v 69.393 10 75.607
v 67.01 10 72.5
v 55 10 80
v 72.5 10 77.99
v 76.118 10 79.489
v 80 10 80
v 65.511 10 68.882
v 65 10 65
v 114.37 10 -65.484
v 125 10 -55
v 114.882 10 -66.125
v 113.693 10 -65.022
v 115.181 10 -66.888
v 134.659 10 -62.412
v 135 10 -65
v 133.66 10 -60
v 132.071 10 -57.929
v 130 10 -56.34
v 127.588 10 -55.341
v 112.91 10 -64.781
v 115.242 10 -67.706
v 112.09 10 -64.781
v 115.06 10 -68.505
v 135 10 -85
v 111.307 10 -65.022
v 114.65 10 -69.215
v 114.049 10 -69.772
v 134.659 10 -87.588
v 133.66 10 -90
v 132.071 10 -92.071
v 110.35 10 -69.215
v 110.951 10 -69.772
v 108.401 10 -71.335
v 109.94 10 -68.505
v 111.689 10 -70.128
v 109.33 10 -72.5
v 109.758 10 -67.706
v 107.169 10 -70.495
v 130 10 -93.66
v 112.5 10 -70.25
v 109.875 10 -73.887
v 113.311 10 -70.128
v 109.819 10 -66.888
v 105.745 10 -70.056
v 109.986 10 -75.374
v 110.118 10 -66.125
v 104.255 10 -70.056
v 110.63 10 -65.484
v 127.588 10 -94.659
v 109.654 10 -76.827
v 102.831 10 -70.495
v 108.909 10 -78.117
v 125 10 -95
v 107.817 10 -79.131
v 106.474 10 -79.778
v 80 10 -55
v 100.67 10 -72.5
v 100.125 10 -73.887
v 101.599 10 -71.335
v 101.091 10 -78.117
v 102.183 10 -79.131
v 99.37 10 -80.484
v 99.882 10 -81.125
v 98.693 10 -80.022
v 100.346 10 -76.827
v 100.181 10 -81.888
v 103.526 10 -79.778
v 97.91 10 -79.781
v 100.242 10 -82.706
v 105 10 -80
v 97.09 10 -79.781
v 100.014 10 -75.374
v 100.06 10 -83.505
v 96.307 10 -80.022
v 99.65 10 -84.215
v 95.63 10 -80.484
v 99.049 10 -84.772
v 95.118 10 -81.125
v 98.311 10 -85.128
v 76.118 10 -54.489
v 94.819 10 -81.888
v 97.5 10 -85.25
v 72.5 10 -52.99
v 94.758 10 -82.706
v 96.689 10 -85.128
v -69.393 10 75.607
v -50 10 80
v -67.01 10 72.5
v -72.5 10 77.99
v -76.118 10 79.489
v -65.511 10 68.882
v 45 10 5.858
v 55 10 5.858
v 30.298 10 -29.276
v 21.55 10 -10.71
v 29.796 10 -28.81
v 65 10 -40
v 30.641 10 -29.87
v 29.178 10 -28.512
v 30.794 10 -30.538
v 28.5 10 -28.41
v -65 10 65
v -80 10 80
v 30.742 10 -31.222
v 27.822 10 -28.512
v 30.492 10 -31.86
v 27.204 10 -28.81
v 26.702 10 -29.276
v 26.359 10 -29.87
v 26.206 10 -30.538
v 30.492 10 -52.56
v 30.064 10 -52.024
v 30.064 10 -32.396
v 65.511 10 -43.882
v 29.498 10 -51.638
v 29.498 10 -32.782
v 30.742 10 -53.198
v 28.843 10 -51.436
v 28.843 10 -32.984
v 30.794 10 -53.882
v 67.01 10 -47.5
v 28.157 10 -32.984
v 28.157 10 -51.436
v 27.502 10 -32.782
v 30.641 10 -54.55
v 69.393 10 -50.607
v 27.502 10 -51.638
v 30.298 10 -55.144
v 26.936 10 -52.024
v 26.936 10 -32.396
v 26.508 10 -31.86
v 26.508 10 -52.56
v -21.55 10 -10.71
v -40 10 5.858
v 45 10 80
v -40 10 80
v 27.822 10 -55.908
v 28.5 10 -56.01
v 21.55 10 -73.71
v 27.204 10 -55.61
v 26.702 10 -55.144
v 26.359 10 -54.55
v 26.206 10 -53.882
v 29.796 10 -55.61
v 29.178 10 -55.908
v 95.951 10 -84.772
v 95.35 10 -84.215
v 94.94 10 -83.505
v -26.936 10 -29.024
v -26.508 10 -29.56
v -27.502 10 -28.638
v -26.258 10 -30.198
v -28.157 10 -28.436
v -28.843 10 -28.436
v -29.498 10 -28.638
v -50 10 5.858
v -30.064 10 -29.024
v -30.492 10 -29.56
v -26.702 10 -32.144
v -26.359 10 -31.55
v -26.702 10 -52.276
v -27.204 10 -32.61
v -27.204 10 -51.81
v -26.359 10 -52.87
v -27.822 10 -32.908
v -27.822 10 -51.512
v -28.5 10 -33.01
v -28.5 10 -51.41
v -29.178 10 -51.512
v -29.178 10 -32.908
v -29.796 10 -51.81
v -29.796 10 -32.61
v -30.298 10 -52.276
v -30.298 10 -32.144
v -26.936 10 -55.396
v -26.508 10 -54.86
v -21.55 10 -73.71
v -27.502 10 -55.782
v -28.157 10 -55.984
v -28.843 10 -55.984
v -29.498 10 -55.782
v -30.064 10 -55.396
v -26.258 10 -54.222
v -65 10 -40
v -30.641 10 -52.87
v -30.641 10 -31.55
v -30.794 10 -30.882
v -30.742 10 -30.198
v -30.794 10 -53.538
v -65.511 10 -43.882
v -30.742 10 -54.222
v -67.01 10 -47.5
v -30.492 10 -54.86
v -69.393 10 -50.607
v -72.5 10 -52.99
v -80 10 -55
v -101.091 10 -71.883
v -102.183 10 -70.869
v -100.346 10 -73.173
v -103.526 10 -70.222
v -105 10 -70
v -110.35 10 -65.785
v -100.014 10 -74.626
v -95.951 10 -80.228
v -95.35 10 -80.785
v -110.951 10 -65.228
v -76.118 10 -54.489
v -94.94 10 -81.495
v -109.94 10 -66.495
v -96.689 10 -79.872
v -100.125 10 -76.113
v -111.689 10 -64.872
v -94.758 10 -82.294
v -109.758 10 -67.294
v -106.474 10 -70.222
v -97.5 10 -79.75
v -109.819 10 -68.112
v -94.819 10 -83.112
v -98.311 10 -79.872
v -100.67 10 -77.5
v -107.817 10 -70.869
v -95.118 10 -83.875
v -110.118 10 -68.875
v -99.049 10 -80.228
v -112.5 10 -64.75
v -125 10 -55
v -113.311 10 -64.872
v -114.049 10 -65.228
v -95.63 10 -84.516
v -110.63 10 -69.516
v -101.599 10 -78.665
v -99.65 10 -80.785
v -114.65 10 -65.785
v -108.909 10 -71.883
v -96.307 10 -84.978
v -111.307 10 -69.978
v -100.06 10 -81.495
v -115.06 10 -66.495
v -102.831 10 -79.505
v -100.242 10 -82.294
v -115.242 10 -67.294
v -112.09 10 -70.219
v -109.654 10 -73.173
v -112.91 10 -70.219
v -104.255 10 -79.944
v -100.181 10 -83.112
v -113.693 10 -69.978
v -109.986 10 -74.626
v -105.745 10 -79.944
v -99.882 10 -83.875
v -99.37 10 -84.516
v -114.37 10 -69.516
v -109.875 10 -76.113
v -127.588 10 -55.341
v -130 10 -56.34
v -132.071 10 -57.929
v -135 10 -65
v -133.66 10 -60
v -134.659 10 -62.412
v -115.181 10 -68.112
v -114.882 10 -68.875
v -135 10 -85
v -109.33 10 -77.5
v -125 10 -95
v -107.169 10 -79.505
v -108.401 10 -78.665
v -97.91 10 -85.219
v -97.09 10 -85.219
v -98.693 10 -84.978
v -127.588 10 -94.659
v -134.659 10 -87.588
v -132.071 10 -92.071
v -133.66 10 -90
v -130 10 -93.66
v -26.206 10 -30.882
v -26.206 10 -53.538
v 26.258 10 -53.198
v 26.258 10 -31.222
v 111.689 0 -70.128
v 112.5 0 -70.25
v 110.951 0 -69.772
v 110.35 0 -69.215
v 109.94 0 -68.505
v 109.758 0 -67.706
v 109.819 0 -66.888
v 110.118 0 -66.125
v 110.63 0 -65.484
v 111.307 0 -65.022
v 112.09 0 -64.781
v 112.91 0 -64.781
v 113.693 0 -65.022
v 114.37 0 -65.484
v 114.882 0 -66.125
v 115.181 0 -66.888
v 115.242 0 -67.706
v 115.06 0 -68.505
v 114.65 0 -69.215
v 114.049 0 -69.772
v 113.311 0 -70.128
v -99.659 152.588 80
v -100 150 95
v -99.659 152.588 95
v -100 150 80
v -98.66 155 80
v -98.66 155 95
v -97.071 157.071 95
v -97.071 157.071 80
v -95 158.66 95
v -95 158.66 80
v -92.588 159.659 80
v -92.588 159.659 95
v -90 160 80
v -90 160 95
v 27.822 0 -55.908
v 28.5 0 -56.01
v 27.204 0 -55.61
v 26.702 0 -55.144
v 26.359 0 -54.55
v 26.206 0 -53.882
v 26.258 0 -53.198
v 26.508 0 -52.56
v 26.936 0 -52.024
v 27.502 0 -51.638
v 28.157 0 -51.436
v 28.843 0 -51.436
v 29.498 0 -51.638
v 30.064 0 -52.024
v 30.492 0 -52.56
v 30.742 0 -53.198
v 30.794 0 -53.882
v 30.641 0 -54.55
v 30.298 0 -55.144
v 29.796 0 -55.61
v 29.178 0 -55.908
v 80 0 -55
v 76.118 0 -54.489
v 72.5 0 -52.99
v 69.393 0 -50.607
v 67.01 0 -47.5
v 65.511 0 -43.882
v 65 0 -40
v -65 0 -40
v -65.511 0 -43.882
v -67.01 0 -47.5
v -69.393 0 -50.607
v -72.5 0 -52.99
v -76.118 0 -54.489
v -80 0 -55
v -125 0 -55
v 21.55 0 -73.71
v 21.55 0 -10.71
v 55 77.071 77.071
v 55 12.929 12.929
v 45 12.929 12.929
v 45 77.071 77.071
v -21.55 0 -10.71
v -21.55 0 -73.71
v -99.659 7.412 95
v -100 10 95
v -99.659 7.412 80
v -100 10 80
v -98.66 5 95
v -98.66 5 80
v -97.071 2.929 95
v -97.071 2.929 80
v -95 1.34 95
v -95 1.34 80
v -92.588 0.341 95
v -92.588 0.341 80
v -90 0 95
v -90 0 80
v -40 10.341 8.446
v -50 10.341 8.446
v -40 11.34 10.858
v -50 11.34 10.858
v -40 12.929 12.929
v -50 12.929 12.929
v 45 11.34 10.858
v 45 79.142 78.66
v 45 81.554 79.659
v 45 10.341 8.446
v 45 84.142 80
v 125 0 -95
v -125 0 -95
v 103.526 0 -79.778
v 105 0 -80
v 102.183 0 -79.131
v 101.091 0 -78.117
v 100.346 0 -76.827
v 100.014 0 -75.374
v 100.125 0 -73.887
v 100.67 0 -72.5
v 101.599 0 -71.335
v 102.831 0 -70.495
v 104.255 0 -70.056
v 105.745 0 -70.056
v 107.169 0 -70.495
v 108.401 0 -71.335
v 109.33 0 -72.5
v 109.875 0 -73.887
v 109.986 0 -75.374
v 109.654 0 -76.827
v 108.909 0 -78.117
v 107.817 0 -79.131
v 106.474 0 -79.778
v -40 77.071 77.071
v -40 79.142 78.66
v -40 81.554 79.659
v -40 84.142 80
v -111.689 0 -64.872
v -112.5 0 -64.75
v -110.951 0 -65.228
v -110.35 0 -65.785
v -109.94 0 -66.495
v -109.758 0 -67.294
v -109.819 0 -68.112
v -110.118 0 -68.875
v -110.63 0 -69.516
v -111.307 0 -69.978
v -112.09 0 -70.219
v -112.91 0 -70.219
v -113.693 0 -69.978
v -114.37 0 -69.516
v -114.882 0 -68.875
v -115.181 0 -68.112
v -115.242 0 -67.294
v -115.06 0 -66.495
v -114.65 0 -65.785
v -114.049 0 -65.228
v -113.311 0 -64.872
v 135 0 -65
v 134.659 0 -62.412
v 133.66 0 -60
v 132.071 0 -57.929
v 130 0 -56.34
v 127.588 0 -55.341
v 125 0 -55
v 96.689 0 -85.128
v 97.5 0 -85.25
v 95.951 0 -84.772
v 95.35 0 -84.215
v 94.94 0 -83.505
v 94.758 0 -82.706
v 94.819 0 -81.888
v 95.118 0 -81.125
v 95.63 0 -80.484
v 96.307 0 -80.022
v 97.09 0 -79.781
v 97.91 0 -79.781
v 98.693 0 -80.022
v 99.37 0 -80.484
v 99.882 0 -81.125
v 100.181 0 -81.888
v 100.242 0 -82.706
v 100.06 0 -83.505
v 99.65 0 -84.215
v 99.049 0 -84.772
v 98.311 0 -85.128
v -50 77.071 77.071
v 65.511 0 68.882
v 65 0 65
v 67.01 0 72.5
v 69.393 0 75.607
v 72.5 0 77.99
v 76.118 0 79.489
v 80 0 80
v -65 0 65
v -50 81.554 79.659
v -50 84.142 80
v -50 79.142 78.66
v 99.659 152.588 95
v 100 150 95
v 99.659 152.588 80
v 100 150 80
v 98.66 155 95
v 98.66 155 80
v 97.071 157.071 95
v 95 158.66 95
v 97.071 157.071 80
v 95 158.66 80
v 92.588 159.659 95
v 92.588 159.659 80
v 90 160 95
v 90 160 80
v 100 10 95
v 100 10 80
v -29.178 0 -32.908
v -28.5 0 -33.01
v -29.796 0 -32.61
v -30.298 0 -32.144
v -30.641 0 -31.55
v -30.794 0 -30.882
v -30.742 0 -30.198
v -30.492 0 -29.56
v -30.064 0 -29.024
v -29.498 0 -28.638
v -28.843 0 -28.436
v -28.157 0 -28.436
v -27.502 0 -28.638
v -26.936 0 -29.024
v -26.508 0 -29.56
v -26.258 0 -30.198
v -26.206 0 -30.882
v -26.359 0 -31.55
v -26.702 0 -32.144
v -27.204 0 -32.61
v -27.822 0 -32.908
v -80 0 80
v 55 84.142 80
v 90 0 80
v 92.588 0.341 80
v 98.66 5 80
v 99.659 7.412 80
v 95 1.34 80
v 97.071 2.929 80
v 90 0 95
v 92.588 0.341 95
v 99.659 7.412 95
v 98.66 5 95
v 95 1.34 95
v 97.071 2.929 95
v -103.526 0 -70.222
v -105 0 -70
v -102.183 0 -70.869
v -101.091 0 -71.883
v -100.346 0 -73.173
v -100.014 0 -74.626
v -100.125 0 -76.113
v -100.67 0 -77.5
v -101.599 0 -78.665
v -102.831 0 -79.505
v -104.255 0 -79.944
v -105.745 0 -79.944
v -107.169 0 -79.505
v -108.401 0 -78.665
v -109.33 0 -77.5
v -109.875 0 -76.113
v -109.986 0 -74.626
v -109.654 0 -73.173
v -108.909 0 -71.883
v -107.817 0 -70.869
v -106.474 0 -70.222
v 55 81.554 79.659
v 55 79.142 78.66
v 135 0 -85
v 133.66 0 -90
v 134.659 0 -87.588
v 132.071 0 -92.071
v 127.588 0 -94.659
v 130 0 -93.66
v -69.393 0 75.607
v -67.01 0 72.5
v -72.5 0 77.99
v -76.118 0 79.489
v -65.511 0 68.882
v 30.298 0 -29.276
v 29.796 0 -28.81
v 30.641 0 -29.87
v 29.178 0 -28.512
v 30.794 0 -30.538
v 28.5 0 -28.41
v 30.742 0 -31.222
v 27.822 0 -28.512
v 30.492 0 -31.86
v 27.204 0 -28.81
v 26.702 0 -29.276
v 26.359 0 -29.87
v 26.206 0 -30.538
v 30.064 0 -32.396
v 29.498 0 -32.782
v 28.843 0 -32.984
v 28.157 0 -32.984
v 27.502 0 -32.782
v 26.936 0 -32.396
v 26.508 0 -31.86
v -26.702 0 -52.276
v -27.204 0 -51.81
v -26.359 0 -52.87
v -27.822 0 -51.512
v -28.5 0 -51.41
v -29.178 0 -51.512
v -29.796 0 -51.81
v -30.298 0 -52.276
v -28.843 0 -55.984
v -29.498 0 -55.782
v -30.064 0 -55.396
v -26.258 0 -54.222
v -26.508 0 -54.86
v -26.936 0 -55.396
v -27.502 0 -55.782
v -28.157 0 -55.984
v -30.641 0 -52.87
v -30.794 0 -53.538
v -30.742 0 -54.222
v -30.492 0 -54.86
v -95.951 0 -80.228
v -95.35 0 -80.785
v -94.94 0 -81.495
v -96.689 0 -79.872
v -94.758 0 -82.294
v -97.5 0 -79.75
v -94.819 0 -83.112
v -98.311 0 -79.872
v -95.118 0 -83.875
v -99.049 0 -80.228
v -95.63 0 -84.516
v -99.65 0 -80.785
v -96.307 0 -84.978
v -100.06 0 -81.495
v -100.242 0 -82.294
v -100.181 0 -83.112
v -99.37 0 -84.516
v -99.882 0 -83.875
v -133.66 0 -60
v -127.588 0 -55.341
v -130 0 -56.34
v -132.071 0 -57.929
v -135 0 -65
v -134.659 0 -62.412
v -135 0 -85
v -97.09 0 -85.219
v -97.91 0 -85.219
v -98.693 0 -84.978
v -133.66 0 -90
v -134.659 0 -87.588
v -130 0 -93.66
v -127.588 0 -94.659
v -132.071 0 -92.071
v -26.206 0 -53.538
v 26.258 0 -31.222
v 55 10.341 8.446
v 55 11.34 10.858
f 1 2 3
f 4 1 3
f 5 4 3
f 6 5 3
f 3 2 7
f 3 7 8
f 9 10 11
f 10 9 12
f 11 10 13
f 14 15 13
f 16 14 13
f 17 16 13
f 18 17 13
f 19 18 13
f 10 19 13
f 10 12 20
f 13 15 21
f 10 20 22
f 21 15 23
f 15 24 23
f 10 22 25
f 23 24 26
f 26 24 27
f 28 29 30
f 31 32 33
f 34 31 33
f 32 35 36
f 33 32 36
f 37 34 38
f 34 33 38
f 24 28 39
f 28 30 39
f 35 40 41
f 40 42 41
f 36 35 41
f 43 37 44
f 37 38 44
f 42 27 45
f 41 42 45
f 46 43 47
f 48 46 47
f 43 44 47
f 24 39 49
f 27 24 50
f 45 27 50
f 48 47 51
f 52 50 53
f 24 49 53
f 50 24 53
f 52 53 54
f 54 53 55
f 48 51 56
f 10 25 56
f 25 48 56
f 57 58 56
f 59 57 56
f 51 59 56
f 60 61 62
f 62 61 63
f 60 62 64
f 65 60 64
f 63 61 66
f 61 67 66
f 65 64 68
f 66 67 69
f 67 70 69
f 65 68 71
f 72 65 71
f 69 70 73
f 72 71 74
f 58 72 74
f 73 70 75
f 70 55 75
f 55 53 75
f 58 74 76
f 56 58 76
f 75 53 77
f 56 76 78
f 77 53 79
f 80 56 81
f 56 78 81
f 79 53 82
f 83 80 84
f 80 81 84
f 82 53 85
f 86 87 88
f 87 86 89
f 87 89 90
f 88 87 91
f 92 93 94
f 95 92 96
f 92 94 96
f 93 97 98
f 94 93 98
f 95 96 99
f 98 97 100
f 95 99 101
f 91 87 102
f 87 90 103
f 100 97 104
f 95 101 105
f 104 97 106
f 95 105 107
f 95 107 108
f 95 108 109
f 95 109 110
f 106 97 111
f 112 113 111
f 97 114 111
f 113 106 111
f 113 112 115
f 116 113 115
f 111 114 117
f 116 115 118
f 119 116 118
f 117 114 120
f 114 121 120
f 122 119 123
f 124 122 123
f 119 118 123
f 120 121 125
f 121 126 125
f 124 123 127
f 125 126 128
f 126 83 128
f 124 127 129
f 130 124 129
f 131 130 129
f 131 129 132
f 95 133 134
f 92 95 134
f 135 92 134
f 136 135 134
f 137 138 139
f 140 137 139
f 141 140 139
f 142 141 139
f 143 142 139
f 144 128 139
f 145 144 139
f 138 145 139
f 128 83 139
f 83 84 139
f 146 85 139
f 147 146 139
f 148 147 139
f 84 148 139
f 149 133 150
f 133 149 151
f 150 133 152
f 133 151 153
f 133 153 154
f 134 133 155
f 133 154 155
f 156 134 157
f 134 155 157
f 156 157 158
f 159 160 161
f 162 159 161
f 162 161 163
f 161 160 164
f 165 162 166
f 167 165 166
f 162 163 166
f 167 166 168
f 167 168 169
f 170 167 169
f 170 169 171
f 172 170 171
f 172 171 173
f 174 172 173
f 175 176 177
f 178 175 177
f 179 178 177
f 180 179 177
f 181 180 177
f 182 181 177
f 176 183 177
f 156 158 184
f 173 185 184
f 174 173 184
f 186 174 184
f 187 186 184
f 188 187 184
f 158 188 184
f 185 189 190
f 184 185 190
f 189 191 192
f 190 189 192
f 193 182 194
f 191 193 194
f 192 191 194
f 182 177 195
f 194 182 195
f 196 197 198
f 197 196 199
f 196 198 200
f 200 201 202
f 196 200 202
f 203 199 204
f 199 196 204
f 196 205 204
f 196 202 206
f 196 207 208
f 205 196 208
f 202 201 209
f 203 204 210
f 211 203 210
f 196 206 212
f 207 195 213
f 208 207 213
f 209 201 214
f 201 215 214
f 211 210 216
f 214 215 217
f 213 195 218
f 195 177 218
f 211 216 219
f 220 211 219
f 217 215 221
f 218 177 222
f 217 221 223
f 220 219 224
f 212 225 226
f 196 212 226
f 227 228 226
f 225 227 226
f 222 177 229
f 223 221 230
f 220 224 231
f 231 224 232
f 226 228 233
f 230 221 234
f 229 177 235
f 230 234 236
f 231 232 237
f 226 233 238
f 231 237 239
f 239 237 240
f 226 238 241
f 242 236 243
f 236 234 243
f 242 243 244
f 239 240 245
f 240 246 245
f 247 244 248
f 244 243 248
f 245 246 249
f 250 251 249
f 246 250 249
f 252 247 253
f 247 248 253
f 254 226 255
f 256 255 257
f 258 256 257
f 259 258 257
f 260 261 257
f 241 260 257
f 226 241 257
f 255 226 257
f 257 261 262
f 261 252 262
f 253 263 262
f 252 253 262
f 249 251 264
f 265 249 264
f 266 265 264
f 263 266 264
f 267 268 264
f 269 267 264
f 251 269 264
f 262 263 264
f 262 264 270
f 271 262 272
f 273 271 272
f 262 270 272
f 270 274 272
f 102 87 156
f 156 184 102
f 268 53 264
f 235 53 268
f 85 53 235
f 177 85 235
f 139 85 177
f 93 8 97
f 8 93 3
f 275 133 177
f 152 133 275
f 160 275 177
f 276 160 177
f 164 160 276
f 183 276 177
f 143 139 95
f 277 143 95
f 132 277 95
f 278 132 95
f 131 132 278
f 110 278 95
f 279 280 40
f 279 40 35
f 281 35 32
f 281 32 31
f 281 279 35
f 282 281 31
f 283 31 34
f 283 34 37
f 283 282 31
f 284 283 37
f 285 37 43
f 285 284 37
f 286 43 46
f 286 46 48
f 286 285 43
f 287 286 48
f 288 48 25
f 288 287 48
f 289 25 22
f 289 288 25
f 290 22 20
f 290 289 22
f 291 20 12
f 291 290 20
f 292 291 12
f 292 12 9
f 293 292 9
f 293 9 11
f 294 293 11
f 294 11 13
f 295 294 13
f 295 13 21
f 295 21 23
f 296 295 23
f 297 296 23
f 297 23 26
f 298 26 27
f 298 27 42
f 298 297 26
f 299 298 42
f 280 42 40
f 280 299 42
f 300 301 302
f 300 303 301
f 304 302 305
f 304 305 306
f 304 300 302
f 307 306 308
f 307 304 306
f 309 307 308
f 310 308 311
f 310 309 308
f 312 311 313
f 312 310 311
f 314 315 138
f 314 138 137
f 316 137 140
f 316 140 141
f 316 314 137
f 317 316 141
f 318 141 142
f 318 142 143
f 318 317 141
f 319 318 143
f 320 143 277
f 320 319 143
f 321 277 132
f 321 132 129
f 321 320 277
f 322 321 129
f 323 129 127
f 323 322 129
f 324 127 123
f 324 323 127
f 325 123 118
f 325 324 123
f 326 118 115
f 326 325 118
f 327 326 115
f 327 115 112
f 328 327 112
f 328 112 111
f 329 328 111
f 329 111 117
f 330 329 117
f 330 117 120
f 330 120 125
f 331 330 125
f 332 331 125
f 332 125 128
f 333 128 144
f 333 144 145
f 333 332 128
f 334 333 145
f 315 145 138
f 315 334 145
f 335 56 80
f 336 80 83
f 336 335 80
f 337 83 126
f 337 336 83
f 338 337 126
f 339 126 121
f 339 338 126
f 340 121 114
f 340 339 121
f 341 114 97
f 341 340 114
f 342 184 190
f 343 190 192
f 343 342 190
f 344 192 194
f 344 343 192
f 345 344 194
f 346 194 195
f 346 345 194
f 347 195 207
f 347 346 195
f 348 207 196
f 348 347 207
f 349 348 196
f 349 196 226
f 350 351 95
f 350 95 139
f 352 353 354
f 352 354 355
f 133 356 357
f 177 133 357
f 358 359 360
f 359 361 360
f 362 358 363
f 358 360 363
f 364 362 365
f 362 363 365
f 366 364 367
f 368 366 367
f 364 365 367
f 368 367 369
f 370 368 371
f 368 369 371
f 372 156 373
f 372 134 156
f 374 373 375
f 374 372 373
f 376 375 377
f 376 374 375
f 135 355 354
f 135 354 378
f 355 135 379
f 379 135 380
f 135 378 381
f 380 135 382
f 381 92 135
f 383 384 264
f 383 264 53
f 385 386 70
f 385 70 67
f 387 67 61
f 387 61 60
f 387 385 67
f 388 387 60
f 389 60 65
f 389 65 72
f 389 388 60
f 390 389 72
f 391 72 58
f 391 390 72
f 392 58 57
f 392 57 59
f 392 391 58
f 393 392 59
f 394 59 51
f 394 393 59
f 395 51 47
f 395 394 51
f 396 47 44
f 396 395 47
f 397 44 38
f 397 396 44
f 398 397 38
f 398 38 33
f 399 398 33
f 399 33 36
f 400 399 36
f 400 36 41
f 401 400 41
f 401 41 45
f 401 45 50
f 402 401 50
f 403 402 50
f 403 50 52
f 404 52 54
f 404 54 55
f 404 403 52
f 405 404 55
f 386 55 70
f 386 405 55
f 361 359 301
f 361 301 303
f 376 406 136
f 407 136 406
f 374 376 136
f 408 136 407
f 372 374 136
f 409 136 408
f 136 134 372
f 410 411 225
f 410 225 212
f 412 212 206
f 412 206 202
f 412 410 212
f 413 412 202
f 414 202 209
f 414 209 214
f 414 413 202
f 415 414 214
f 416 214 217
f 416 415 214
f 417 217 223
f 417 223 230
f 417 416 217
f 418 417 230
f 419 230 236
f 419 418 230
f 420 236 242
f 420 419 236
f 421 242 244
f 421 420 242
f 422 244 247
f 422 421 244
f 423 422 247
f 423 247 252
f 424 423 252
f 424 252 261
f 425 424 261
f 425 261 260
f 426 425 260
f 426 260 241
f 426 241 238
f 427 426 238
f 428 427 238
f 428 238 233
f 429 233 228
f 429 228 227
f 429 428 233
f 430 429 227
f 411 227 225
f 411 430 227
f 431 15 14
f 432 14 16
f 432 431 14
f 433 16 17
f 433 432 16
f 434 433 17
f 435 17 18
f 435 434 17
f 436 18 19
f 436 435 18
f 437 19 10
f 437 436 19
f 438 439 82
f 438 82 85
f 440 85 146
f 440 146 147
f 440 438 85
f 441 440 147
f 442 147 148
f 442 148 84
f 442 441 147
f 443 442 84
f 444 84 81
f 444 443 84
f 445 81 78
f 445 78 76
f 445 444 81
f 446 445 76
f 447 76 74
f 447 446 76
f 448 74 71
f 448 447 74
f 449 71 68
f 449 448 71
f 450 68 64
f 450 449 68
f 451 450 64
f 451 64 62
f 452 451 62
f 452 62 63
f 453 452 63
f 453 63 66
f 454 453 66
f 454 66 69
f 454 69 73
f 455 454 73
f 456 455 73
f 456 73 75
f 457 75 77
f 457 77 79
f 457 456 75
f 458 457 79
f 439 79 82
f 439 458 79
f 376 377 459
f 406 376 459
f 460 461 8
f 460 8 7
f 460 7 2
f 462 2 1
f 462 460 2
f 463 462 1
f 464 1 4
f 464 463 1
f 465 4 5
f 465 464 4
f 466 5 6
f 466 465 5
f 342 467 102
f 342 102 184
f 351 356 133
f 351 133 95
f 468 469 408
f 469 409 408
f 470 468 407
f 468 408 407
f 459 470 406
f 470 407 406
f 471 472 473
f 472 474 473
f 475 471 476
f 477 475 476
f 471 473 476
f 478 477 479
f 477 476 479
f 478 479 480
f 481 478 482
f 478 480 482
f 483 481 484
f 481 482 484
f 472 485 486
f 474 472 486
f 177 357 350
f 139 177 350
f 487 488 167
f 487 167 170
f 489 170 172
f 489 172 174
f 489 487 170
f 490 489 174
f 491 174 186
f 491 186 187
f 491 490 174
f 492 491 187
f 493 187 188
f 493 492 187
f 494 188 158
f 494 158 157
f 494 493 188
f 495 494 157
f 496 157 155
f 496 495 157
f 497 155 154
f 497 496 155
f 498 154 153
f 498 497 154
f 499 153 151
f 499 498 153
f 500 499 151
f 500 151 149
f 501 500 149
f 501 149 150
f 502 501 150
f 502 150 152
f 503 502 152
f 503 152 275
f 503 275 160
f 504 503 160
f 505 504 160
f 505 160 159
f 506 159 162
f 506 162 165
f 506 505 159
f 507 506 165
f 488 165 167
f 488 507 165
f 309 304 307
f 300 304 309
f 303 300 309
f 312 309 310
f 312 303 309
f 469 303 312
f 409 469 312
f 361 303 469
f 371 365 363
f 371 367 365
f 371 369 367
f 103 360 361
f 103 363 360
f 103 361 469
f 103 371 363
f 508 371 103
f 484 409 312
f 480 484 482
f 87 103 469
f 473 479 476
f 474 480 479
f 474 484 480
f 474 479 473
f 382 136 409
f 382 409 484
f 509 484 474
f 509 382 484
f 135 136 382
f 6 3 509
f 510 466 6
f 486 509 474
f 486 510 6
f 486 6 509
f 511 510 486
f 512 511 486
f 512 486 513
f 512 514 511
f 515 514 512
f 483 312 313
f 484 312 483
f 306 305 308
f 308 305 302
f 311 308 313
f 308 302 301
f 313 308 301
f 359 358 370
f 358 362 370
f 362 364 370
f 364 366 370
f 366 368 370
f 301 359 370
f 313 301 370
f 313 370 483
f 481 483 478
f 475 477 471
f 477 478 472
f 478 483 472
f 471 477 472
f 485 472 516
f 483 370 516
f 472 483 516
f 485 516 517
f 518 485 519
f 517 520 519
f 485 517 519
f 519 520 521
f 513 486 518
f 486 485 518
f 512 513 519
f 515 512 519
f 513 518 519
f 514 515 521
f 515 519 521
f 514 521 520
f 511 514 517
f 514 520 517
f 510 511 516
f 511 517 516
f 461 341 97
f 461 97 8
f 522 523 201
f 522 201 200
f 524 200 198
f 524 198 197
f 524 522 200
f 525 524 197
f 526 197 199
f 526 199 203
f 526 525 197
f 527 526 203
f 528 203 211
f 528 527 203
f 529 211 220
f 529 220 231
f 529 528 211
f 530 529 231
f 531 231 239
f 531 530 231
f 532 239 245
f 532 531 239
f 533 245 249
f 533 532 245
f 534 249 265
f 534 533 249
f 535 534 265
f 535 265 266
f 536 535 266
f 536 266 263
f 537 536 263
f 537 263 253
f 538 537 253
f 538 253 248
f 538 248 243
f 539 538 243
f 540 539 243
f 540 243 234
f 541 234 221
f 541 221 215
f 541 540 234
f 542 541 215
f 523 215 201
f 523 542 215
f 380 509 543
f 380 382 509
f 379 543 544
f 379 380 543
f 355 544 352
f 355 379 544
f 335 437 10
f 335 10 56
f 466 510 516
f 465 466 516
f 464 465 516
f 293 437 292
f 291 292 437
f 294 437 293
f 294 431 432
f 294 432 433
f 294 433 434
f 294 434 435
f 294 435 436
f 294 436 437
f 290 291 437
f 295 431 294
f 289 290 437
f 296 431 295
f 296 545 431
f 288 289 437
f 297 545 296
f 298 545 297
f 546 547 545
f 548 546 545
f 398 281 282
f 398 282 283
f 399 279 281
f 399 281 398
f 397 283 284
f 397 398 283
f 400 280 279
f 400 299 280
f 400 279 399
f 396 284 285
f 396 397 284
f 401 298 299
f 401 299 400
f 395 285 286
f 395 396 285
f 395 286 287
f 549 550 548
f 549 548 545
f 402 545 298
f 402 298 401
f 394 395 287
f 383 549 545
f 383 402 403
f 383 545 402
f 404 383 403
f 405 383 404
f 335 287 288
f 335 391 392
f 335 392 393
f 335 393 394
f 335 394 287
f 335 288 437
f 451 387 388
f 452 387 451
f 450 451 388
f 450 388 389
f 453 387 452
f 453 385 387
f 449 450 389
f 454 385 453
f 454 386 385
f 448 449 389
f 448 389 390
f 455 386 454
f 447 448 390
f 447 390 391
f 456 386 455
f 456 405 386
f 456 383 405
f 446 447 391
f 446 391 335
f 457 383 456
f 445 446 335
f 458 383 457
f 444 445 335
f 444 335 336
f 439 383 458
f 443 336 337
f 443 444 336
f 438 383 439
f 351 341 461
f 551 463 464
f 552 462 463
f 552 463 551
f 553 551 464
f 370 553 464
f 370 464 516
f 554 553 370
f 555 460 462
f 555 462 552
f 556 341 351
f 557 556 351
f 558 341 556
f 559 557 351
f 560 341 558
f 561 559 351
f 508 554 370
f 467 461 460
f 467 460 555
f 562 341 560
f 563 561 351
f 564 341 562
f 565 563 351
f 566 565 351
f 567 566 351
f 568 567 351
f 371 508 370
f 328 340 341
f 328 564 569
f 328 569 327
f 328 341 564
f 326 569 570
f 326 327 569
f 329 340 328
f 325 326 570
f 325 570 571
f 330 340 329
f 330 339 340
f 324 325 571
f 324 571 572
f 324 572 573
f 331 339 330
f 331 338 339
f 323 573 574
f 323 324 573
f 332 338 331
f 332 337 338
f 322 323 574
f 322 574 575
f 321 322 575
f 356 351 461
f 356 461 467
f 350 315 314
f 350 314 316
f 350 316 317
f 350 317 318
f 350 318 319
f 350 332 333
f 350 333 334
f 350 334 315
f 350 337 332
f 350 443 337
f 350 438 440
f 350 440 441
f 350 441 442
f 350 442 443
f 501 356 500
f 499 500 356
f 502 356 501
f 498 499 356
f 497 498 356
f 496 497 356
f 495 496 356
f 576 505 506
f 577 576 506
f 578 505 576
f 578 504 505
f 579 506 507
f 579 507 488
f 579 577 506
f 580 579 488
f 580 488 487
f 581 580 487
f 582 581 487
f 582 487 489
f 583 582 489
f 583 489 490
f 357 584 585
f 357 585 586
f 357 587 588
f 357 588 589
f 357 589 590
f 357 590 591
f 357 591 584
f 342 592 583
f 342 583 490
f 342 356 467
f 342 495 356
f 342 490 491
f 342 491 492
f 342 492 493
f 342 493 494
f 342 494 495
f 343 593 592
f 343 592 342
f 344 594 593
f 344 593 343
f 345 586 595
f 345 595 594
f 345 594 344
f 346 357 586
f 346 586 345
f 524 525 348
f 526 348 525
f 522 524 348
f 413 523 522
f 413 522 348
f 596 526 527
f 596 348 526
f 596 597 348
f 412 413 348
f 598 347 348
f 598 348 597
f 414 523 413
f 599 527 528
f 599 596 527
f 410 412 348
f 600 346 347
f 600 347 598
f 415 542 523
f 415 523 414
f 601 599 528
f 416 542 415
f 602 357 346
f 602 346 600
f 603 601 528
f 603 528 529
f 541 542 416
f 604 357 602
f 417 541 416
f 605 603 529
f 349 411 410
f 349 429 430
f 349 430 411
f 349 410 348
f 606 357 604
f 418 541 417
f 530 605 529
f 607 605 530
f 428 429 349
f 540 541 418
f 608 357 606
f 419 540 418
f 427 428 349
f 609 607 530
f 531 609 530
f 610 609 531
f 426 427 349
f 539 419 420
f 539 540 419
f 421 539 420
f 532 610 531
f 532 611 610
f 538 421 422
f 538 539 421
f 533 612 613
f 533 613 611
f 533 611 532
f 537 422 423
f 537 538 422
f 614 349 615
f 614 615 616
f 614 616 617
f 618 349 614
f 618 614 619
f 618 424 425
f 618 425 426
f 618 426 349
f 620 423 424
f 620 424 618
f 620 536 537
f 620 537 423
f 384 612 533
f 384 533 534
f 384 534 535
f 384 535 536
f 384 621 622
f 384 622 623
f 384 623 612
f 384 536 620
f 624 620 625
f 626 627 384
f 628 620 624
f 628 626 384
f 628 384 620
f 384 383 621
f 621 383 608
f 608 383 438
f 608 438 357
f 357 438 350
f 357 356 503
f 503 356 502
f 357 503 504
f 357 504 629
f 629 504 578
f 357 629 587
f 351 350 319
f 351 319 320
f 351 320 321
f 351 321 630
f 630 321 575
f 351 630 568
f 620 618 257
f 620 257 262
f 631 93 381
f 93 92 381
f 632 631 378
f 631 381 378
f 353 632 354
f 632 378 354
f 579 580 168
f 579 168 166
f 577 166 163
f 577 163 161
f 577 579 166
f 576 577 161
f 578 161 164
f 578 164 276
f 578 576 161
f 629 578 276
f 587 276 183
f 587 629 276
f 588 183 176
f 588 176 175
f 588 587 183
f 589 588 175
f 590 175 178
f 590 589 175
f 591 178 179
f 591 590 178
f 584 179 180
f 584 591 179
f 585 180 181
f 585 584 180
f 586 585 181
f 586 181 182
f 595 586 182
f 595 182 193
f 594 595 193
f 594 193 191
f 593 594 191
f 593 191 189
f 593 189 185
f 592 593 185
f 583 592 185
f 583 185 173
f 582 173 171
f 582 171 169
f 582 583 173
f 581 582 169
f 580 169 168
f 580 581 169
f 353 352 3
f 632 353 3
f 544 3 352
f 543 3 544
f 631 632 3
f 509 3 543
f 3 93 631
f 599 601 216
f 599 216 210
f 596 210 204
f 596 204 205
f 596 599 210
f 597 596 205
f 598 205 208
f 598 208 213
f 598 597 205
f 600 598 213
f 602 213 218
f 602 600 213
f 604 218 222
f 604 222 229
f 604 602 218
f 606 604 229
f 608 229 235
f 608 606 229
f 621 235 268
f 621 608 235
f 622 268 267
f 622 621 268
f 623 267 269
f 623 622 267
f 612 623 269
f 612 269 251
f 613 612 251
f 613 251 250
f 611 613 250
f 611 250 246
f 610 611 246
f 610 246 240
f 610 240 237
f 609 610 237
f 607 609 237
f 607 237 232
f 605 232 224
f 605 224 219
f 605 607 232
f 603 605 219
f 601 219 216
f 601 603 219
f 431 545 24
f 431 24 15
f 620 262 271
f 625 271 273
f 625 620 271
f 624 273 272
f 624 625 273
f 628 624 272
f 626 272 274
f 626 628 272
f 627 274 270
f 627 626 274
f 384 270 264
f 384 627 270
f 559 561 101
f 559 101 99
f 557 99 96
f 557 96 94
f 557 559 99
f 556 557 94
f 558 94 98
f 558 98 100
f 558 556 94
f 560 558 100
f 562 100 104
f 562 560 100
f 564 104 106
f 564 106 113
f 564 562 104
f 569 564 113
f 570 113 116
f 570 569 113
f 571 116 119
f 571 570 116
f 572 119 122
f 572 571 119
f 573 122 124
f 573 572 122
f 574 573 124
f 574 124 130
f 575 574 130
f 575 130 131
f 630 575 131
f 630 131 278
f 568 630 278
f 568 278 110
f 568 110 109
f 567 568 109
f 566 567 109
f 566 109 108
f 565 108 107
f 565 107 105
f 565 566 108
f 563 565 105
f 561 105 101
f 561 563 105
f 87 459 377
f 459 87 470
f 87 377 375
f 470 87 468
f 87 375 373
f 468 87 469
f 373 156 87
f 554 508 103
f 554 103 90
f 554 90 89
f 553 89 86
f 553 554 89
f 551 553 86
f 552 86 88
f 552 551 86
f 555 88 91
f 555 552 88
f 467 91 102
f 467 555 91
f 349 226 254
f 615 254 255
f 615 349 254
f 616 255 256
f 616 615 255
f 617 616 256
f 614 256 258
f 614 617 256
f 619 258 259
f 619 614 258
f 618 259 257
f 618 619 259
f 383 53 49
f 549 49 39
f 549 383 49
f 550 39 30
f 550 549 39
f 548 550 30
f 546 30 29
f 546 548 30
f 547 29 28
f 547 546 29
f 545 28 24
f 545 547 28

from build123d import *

# Parameters (mm, degrees)
SKIZZE1_R                       = 5
SKIZZE1_R_2                     = 2.75
SKIZZE1_R_3                     = 2.3
SKIZZE1_W                       = 43.1
SKIZZE1_H                       = 63
AUFSATZ_LINEAR_AUSTRAGEN1_DEPTH = 10
SKIZZE3_W                       = 200
SKIZZE3_H                       = 15
AUFSATZ_LINEAR_AUSTRAGEN2_DEPTH = 150
VERRUNDUNG1_R                   = 10
AUFSATZ_LINEAR_AUSTRAGEN3_DEPTH = 10
AUFSATZ_LINEAR_AUSTRAGEN4_DEPTH = 10
VERRUNDUNG2_R                   = 10


with BuildPart() as part:
    # Skizze1 → Aufsatz-Linear austragen1 (new body)
    with BuildSketch(Plane(origin=(0, 0, 0), x_dir=(1, 0, 0), z_dir=(0, 1, 0))):
        with BuildLine():
            Line((-125, 95), (125, 95))
            ThreePointArc((125, 95), (132.071067812, 92.071067812), (135, 85))
            Line((135, 85), (135, 65))
            ThreePointArc((135, 65), (132.071067812, 57.928932188), (125, 55))
            Line((125, 55), (80, 55))
            ThreePointArc((80, 55), (69.393398282, 50.606601718), (65, 40))
            Line((65, 40), (65, -65))
            ThreePointArc((65, -65), (69.393398282, -75.606601718), (80, -80))
            Line((80, -80), (90, -80))
            Line((90, -80), (100, -80))
            Line((100, -80), (100, -95))
            Line((100, -95), (80, -95))
            Line((80, -95), (-80, -95))
            Line((-80, -95), (-100, -95))
            Line((-100, -95), (-100, -80))
            Line((-100, -80), (-90, -80))
            Line((-90, -80), (-80, -80))
            ThreePointArc((-80, -80), (-69.393398282, -75.606601718), (-65, -65))
            Line((-65, -65), (-65, 40))
            ThreePointArc((-65, 40), (-69.393398282, 50.606601718), (-80, 55))
            Line((-80, 55), (-125, 55))
            ThreePointArc((-125, 55), (-132.071067812, 57.928932188), (-135, 65))
            Line((-135, 65), (-135, 85))
            ThreePointArc((-135, 85), (-132.071067812, 92.071067812), (-125, 95))
        make_face()
        with Locations(Location((-105, 75, 0), (0, 0, 270))):
            Circle(SKIZZE1_R, mode=Mode.SUBTRACT)
        with Locations(Location((105, 75, 0), (0, 0, 90))):
            Circle(SKIZZE1_R, mode=Mode.SUBTRACT)
        with Locations(Location((-97.5, 82.5, 0), (0, 0, 270))):
            Circle(SKIZZE1_R_2, mode=Mode.SUBTRACT)
        with Locations(Location((-112.5, 67.5, 0), (0, 0, 270))):
            Circle(SKIZZE1_R_2, mode=Mode.SUBTRACT)
        with Locations(Location((97.5, 82.5, 0), (0, 0, 90))):
            Circle(SKIZZE1_R_2, mode=Mode.SUBTRACT)
        with Locations(Location((112.5, 67.5, 0), (0, 0, 90))):
            Circle(SKIZZE1_R_2, mode=Mode.SUBTRACT)
        with Locations(Location((-28.5, 53.71, 0), (0, 0, 270))):
            Circle(SKIZZE1_R_3, mode=Mode.SUBTRACT)
        with Locations(Location((-28.5, 30.71, 0), (0, 0, 90))):
            Circle(SKIZZE1_R_3, mode=Mode.SUBTRACT)
        with Locations(Location((28.5, 30.71, 0), (0, 0, 270))):
            Circle(SKIZZE1_R_3, mode=Mode.SUBTRACT)
        with Locations(Location((28.5, 53.71, 0), (0, 0, 90))):
            Circle(SKIZZE1_R_3, mode=Mode.SUBTRACT)
        with Locations((0, 42.21)):
            Rectangle(SKIZZE1_W, SKIZZE1_H, mode=Mode.SUBTRACT)
    extrude(amount=AUFSATZ_LINEAR_AUSTRAGEN1_DEPTH)

    # Skizze3 → Aufsatz-Linear austragen2 (add)
    with BuildSketch(Plane(origin=(0, 10, 0), x_dir=(1, 0, 0), z_dir=(0, 1, 0))):
        with Locations((0, -87.5)):
            Rectangle(SKIZZE3_W, SKIZZE3_H)
    extrude(amount=AUFSATZ_LINEAR_AUSTRAGEN2_DEPTH)

    # Verrundung1
    verrundung1_edges = [part.edges().sort_by_distance(p)[0] for p in [
        (-100, 160, 87.5),
        (100, 160, 87.5),
        (100, 0, 87.5),
        (-100, 0, 87.5),
    ]]
    fillet(verrundung1_edges, radius=VERRUNDUNG1_R)

    # Skizze5 → Aufsatz-Linear austragen3 (add)
    with BuildSketch(Plane.ZY.offset(50)):
        Polygon((10, 10), (80, 80), (80, 10), align=None)
    extrude(amount=-AUFSATZ_LINEAR_AUSTRAGEN3_DEPTH)

    # Skizze6 → Aufsatz-Linear austragen4 (add)
    with BuildSketch(Plane(origin=(55, 0, 0), x_dir=(0, 0, -1), z_dir=(1, 0, 0))):
        Polygon((-10, 10), (-80, 80), (-80, 10), align=None)
    extrude(amount=-AUFSATZ_LINEAR_AUSTRAGEN4_DEPTH)

    # Verrundung2
    verrundung2_edges = [part.edges().sort_by_distance(p)[0] for p in [
        (-45, 10, 10),
        (-45, 80, 80),
        (50, 10, 10),
        (50, 80, 80),
    ]]
    fillet(verrundung2_edges, radius=VERRUNDUNG2_R)


solid = part.part
